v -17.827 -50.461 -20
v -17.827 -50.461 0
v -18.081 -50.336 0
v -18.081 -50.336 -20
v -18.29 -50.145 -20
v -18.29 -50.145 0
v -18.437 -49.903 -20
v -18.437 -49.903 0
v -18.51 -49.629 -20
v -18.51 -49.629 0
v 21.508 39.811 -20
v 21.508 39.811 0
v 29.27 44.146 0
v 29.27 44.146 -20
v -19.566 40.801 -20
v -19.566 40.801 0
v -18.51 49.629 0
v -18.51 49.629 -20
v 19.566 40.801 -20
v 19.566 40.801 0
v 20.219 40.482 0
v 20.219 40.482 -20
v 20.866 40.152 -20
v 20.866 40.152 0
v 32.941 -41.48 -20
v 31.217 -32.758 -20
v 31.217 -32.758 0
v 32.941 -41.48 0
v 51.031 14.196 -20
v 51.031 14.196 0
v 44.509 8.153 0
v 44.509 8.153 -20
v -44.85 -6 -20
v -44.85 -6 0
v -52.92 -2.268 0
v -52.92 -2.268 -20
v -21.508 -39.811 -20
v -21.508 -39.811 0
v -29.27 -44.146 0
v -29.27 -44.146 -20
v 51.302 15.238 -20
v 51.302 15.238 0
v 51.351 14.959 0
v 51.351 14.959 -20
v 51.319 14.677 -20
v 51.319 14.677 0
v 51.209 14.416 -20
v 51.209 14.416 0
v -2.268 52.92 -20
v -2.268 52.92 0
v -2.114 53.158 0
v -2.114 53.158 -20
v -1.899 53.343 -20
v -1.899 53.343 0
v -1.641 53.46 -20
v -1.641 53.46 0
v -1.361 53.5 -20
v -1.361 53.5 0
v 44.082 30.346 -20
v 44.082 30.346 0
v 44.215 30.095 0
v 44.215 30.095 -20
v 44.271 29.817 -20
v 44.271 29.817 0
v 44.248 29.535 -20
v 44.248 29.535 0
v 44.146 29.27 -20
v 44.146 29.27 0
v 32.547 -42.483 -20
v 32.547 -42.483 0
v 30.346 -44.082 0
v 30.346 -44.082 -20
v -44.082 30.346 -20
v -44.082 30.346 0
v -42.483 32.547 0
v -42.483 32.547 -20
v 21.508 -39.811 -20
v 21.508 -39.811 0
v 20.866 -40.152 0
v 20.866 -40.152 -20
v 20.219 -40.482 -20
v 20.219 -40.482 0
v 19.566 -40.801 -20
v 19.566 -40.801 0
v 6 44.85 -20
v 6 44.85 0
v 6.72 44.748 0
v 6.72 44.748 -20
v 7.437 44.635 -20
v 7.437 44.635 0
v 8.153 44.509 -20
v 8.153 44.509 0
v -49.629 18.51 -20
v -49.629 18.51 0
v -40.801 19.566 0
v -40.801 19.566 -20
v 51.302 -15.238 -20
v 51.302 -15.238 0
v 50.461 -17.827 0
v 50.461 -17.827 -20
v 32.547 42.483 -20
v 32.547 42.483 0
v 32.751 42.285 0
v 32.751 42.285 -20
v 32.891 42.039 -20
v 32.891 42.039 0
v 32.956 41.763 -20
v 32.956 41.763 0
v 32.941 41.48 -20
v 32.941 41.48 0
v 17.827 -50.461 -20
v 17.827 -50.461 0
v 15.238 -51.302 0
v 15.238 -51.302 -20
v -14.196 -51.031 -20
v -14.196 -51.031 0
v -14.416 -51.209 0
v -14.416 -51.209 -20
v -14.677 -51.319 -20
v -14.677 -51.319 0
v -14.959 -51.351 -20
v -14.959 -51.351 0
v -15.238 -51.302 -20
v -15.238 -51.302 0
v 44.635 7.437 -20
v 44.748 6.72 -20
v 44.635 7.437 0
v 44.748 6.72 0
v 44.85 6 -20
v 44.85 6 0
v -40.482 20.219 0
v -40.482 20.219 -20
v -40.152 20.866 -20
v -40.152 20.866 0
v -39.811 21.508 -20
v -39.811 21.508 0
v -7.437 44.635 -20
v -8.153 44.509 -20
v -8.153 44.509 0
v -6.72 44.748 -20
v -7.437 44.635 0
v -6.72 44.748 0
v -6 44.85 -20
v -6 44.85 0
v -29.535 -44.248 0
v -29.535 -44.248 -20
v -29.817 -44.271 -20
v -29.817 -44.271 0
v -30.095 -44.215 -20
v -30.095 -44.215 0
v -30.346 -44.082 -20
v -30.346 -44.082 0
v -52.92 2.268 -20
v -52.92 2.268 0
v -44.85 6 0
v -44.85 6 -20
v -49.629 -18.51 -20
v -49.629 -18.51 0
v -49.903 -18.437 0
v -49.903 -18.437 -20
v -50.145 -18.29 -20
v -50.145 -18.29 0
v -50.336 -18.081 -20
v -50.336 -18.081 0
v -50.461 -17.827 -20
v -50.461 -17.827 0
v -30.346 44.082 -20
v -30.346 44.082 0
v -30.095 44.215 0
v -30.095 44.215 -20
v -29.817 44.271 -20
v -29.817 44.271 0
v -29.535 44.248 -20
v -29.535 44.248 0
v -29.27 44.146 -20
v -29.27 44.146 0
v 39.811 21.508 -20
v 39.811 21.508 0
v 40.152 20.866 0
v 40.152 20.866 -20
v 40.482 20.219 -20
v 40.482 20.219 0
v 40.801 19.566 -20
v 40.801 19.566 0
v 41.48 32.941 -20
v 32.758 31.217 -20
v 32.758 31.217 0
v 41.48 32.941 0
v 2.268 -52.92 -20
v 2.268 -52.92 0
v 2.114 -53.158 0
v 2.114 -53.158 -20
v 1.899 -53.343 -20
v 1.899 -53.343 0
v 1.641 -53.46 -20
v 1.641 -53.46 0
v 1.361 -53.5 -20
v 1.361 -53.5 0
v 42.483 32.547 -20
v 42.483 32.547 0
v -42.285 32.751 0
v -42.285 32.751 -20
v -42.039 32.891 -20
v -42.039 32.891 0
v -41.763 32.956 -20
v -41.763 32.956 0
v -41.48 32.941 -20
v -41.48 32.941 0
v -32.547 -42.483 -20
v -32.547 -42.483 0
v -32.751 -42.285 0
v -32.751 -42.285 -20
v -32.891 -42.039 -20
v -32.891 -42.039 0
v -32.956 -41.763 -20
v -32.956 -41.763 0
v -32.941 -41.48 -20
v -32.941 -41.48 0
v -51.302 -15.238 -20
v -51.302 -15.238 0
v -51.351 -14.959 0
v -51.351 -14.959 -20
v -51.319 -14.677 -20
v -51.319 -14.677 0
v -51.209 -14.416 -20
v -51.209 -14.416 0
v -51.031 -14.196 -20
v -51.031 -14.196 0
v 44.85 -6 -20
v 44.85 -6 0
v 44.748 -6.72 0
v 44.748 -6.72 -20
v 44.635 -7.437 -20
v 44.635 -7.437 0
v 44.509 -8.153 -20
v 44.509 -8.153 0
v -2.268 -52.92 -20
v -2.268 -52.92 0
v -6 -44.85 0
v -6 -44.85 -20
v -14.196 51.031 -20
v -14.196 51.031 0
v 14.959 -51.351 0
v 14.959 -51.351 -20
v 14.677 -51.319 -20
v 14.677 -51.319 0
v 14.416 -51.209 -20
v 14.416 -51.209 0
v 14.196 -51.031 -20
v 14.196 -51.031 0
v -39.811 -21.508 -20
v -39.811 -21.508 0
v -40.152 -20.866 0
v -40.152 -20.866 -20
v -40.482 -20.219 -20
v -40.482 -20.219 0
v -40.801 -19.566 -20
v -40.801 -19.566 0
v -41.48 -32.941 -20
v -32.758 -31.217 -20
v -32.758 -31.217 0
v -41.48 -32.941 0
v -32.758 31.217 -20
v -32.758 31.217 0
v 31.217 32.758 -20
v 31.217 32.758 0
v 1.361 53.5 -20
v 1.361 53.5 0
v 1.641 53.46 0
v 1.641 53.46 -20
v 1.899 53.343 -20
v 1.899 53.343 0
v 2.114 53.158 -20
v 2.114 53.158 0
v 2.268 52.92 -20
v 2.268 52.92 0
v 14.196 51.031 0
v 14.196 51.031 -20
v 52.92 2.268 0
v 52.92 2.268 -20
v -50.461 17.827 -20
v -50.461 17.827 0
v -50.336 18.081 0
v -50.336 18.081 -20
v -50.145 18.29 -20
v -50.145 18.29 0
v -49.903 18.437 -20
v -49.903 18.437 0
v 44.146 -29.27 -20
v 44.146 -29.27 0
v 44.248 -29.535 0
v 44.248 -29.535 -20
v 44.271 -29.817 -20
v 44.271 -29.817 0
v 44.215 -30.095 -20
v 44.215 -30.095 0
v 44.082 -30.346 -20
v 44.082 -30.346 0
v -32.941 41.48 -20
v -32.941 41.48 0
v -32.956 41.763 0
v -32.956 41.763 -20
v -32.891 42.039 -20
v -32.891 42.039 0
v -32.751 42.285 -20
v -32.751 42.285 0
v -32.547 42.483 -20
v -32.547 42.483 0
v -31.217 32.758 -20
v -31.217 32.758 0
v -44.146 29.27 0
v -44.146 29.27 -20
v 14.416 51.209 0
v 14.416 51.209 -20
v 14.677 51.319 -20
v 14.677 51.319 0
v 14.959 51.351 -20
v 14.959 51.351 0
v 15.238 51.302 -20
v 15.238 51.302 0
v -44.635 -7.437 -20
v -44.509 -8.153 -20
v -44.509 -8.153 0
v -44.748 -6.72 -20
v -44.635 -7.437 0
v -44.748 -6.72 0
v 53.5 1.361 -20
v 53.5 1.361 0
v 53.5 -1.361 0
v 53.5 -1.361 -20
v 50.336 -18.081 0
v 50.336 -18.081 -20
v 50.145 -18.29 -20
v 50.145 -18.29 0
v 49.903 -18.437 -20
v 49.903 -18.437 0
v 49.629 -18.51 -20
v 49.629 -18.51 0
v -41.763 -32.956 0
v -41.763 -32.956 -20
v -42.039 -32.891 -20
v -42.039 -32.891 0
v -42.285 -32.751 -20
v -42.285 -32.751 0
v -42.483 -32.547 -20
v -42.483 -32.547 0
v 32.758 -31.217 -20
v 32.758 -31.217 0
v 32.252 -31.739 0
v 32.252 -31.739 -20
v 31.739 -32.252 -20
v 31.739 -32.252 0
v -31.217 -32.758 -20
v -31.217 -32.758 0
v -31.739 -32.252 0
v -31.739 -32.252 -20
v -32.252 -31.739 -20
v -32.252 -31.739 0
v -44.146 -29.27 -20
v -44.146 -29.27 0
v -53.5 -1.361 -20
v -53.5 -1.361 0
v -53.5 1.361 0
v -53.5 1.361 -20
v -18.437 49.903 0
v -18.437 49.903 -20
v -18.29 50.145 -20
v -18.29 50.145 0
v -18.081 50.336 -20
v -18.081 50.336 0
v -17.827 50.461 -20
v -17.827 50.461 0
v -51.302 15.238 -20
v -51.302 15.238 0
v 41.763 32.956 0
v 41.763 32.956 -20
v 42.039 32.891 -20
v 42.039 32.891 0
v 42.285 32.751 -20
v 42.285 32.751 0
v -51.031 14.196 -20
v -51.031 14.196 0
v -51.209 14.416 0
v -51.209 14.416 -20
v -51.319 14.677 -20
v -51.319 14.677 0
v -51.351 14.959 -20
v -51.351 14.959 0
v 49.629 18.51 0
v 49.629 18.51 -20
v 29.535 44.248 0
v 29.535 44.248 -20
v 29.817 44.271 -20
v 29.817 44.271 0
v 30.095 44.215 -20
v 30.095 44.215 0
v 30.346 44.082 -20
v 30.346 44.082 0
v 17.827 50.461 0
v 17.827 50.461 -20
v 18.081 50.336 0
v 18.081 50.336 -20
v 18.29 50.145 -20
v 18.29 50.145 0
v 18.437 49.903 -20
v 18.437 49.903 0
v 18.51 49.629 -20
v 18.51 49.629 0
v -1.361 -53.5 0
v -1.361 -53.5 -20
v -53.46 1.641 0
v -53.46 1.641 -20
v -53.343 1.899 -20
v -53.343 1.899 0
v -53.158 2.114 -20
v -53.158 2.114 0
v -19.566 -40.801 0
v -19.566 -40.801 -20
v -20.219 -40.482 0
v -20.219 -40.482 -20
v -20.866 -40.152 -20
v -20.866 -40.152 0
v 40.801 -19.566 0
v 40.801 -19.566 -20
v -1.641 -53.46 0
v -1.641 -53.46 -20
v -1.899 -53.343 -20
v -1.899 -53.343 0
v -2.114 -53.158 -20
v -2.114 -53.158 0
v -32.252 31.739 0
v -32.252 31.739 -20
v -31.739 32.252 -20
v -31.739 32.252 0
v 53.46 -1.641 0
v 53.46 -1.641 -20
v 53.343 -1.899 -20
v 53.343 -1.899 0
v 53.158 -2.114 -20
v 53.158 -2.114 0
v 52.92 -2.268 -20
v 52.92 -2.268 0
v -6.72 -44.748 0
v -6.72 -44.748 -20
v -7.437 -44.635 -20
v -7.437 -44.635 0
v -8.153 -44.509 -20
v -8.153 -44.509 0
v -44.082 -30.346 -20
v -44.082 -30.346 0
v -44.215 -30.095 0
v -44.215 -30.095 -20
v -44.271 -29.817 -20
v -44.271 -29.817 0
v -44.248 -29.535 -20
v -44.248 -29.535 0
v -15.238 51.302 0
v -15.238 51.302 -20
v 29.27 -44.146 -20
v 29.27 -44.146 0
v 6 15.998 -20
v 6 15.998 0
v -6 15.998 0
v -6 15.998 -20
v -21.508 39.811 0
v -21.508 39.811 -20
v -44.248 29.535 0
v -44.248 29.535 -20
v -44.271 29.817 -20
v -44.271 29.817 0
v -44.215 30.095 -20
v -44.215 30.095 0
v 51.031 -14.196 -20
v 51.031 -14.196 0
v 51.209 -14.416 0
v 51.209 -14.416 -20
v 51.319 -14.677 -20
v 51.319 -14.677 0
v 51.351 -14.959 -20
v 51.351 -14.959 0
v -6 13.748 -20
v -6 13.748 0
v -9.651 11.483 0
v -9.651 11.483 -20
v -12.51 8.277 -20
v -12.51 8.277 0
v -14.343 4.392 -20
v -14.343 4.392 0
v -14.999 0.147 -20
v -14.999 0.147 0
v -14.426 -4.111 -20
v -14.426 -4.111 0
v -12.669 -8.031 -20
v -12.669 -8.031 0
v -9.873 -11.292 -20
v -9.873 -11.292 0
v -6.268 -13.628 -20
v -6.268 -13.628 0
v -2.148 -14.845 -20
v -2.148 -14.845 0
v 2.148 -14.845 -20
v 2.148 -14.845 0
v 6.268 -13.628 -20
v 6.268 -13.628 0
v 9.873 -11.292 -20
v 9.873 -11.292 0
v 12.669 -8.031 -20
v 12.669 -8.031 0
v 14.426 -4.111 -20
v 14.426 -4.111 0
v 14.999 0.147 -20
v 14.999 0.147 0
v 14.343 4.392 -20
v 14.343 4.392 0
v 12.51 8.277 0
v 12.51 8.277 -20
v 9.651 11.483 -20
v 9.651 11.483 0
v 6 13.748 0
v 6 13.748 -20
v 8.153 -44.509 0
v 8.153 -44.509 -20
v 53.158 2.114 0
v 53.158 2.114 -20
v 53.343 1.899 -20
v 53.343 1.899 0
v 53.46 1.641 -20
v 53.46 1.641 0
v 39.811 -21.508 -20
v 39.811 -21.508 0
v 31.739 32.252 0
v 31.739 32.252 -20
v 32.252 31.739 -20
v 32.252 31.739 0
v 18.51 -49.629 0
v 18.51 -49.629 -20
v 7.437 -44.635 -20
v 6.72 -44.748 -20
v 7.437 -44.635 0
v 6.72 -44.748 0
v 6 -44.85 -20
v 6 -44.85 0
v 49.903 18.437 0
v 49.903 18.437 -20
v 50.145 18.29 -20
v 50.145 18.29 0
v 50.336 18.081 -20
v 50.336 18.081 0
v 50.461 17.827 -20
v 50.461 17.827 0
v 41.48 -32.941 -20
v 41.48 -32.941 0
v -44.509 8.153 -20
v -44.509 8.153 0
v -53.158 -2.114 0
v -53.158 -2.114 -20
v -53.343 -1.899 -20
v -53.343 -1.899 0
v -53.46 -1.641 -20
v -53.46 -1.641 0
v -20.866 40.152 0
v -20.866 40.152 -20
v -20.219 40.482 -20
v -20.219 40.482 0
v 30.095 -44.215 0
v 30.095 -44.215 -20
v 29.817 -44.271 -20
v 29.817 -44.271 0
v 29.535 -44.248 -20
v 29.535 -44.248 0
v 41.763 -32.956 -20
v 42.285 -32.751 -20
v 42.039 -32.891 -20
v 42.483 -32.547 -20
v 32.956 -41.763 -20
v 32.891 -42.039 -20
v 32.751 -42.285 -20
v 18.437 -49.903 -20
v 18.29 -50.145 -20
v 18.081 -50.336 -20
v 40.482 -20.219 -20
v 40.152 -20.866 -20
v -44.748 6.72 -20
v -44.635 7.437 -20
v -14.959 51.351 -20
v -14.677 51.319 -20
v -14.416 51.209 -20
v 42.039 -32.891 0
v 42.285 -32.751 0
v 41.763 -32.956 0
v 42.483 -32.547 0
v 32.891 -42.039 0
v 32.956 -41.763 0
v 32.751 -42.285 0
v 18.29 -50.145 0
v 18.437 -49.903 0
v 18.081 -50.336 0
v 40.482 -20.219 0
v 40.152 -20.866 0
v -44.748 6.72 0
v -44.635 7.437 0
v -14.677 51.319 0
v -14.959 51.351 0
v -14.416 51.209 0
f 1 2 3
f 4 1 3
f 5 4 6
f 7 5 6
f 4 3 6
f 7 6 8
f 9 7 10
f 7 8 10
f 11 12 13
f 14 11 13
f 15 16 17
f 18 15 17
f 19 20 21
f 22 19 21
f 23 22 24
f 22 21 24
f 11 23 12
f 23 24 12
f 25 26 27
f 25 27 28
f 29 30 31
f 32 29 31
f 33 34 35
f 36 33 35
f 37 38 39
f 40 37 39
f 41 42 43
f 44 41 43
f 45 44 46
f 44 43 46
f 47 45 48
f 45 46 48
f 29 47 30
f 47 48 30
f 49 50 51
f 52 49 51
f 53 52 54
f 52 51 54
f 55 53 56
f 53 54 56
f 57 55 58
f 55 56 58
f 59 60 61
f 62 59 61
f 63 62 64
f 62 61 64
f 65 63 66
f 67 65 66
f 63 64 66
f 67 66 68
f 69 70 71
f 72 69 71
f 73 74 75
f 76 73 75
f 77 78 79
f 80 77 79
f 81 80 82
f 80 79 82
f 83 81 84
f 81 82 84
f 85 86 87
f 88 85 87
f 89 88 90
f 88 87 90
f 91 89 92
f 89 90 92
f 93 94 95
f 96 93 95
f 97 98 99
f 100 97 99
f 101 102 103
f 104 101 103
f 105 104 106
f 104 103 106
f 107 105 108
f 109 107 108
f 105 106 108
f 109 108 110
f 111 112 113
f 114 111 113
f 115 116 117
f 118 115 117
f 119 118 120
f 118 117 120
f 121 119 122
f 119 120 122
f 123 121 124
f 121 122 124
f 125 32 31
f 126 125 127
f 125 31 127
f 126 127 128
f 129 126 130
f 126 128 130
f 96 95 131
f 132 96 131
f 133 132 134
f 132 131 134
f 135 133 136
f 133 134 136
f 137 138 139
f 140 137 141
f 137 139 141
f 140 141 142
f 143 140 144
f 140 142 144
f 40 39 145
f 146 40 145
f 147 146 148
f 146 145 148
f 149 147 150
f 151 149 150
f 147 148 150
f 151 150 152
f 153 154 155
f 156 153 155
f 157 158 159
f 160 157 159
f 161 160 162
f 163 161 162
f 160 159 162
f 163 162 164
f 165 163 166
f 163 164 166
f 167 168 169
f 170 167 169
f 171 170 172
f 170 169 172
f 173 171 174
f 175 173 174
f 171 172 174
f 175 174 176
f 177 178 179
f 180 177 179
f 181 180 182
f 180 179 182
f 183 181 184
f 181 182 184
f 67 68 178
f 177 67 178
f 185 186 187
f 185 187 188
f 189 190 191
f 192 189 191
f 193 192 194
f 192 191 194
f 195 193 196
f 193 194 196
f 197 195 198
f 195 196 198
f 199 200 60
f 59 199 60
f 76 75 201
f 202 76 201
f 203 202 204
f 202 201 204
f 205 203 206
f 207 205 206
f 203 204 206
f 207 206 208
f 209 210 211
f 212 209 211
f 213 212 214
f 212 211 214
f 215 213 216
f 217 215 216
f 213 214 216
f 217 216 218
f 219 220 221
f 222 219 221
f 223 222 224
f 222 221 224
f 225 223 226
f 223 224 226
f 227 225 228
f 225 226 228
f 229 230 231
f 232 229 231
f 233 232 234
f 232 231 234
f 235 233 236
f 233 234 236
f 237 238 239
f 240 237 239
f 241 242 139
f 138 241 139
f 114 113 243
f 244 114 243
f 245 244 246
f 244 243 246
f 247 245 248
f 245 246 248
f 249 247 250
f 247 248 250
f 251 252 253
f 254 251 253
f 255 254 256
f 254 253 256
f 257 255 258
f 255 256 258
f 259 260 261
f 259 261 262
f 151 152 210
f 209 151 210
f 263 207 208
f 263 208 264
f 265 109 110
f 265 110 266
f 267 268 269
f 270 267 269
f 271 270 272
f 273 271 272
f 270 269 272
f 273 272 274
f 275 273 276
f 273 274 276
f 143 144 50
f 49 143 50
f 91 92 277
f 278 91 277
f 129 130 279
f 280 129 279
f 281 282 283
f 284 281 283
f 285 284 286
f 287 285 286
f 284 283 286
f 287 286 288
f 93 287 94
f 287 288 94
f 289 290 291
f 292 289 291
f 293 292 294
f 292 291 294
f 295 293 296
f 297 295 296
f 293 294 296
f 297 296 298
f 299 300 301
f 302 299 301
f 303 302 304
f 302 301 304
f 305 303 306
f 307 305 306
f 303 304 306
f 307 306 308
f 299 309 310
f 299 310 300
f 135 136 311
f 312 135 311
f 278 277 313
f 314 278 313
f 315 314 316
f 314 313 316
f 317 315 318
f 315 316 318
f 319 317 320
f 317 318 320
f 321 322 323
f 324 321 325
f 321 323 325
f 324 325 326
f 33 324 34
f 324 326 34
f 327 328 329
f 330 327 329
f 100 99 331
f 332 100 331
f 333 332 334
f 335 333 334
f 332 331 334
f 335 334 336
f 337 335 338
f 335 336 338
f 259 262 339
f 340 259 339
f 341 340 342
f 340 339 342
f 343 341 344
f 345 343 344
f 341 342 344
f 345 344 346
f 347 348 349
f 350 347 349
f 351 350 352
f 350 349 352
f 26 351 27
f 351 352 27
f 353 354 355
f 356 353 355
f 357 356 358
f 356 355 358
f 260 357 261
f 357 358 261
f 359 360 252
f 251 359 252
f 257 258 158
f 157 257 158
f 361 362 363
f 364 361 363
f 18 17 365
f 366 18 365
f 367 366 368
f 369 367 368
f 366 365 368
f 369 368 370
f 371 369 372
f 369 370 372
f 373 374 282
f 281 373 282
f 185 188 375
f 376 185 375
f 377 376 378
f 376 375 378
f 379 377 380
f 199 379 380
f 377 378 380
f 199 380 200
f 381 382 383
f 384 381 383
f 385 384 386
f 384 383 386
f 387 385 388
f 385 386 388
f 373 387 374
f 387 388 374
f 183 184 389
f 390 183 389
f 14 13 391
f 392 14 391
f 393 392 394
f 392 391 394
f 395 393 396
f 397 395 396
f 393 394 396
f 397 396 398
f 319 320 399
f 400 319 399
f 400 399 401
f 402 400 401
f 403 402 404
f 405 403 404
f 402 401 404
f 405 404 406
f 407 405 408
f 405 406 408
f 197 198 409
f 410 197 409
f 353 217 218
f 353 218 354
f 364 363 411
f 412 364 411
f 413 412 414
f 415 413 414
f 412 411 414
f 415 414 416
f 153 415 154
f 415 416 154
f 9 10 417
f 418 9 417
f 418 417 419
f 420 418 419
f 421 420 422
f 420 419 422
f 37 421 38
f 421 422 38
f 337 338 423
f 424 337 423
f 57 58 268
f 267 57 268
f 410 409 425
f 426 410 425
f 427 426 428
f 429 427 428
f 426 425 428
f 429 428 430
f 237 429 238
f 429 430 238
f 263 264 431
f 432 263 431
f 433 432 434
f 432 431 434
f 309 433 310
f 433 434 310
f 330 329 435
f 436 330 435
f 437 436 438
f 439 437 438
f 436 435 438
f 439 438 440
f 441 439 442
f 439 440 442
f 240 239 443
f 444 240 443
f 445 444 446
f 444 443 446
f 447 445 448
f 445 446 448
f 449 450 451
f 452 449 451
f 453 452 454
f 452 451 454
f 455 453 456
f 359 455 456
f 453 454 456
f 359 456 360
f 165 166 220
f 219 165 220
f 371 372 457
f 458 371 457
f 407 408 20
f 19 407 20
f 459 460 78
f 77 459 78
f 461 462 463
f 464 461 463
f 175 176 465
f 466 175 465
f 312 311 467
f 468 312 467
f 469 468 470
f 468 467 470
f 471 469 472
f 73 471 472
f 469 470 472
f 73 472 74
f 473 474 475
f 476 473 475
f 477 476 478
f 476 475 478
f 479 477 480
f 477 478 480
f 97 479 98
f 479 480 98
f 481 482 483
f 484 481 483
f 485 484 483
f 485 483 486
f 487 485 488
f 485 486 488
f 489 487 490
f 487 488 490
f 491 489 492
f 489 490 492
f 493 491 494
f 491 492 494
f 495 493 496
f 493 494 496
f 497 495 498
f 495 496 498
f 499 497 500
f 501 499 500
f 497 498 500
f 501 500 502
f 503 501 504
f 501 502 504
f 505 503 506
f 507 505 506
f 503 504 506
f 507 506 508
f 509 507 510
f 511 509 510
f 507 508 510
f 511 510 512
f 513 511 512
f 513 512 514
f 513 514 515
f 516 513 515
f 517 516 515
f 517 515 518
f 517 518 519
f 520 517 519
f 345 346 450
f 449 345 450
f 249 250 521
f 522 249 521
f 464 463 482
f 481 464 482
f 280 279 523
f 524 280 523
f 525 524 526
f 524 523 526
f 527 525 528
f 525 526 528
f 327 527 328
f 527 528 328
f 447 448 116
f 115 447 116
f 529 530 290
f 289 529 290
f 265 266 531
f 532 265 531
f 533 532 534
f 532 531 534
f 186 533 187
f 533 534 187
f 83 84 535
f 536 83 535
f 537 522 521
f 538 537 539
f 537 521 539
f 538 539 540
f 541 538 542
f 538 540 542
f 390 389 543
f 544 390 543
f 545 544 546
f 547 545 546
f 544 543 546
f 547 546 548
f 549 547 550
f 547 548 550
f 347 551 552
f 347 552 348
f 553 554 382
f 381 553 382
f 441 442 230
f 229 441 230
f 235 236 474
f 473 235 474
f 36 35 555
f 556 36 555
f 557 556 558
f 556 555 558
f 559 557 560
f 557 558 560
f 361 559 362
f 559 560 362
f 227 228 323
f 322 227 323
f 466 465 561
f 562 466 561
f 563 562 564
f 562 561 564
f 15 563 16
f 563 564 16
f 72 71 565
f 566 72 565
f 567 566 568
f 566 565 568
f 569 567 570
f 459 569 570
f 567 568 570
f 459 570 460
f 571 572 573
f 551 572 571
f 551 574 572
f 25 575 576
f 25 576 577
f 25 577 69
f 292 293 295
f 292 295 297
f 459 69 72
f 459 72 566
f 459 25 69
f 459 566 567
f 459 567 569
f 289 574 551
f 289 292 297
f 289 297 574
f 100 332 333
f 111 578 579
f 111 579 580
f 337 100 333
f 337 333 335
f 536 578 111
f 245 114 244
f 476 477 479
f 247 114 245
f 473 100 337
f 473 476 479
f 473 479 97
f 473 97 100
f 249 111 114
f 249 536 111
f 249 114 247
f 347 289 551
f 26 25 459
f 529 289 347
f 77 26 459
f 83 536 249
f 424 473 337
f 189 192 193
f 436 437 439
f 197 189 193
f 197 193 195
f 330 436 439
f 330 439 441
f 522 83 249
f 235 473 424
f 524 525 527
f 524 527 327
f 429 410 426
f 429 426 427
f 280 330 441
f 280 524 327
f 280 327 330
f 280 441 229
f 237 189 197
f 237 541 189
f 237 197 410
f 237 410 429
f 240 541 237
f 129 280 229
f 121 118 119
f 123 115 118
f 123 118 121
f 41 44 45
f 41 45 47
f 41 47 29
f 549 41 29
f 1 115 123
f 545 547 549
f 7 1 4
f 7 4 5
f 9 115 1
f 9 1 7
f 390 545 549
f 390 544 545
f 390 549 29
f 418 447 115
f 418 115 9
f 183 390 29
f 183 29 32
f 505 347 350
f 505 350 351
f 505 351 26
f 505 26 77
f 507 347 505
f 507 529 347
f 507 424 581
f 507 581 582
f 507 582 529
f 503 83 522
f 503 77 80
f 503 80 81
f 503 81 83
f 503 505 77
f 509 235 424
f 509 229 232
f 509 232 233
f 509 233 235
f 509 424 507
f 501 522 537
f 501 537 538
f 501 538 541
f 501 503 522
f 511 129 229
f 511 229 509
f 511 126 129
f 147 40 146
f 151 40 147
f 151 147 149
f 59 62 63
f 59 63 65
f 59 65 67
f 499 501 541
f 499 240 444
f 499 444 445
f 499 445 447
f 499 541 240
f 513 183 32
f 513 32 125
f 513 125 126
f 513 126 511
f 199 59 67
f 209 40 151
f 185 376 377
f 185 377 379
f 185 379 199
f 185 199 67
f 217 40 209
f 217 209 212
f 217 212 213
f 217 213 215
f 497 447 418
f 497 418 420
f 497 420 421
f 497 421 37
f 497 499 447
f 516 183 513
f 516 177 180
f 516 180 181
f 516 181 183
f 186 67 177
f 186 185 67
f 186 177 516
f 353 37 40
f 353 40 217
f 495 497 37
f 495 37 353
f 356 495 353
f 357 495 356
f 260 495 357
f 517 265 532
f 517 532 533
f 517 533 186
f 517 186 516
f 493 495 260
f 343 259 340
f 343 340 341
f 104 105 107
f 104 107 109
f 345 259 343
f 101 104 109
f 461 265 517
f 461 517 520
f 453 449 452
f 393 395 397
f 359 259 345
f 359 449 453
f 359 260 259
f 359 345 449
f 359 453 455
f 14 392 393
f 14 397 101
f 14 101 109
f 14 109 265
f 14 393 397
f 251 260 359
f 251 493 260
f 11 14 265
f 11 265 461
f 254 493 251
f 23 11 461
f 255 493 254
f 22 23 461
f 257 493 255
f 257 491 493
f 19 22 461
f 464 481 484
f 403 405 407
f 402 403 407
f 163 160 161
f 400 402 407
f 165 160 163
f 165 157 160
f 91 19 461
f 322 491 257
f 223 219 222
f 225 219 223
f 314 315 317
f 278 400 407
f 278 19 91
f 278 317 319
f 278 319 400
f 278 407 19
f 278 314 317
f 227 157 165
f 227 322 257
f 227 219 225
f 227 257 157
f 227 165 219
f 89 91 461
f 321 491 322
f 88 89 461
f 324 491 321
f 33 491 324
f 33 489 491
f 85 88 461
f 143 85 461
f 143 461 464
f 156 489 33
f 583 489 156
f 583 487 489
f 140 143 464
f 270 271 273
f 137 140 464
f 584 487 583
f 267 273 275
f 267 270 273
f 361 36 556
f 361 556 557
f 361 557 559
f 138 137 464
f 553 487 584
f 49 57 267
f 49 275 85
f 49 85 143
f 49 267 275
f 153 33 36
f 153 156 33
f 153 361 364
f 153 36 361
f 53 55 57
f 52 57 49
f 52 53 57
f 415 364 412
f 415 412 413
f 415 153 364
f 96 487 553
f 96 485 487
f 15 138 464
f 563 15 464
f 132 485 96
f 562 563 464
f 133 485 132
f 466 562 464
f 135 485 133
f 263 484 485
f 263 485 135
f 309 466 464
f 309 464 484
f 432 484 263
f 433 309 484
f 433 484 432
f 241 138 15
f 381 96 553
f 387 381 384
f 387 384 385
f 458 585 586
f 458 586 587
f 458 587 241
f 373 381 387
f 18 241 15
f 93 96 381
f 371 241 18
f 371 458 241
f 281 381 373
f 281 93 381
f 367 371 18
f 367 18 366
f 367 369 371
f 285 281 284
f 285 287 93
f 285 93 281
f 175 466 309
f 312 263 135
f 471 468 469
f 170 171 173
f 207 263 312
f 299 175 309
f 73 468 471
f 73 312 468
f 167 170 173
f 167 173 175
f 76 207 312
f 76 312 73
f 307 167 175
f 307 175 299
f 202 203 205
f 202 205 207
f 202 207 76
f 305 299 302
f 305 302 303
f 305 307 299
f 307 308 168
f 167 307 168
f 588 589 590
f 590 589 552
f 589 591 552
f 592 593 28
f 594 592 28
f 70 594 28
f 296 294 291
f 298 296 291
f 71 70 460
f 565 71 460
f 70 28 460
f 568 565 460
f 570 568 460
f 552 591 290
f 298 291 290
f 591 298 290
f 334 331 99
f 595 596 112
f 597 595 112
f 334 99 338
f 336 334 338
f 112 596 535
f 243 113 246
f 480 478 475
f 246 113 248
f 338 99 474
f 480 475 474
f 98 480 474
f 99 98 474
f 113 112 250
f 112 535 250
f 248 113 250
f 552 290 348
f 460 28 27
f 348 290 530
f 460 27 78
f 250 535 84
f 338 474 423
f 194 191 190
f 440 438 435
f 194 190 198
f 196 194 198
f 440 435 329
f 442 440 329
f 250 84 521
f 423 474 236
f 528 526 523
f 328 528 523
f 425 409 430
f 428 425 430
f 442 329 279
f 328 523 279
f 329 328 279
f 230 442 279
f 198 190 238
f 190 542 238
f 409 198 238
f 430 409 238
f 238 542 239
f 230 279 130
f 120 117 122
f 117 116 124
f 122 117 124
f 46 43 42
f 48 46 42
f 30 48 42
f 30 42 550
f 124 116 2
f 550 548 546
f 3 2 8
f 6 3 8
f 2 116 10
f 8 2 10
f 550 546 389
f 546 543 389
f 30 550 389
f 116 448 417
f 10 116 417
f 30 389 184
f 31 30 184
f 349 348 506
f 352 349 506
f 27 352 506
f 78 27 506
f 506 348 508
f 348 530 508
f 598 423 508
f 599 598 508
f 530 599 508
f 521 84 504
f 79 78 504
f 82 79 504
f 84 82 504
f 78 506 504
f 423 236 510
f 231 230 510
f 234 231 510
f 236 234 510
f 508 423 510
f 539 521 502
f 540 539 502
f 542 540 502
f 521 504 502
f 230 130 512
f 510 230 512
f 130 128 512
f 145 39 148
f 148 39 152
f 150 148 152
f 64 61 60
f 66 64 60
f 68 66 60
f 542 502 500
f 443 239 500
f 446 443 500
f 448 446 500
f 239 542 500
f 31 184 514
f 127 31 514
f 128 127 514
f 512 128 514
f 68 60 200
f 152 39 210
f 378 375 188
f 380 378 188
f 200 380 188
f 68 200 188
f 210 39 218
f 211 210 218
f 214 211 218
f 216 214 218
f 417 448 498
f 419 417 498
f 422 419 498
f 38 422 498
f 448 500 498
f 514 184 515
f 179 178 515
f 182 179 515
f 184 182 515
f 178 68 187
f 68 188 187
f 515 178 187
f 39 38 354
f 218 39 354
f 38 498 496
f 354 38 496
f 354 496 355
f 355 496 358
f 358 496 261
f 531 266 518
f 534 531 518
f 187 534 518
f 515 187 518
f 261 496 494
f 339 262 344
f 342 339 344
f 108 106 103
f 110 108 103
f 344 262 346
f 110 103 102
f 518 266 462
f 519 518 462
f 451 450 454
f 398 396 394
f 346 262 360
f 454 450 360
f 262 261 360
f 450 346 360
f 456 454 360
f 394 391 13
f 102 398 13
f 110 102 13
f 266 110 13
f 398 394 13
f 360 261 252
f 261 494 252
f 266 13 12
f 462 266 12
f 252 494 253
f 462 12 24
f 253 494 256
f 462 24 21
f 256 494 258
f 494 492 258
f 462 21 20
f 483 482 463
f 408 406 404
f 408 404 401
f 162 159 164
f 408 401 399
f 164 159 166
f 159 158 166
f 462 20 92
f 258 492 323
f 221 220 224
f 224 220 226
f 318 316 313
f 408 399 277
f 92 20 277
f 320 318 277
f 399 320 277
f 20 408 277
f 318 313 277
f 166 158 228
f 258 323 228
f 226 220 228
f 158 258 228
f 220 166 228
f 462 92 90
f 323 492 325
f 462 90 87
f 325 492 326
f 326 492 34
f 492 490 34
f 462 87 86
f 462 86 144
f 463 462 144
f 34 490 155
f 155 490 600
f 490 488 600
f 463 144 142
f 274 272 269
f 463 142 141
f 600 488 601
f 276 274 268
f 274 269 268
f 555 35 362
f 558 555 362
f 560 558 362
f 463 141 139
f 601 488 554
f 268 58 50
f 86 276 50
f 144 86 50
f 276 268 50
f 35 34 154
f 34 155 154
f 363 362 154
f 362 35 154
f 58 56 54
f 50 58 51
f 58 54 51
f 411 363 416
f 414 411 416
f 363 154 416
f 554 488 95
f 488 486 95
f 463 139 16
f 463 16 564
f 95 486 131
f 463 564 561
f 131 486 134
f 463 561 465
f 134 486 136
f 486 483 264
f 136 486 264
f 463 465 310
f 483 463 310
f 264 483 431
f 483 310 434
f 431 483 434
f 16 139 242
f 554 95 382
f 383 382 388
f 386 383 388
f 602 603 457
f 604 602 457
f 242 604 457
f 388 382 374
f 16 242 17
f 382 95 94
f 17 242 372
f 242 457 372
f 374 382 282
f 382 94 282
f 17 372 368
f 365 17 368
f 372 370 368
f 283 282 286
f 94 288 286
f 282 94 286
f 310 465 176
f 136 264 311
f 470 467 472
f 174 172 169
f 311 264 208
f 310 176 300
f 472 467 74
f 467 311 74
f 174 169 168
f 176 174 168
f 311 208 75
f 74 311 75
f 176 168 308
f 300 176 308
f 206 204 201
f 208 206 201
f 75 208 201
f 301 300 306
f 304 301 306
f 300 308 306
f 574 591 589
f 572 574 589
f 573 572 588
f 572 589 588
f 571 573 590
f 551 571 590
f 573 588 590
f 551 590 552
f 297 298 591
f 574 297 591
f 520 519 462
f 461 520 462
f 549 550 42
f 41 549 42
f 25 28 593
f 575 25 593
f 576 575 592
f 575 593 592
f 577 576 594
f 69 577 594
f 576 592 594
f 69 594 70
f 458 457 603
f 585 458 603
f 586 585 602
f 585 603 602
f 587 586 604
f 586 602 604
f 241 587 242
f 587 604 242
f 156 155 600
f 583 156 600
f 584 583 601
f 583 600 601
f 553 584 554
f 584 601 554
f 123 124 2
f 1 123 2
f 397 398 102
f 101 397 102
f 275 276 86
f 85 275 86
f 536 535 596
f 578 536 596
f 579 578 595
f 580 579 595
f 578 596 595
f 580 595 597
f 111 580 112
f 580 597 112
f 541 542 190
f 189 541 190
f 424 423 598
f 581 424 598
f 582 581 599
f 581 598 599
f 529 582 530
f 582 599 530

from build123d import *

# Parameters (mm, degrees)
BOSS_EXTRUDE1_DEPTH = 20


with BuildPart() as part:
    # Sketch1 → Boss-Extrude1 (new body)
    with BuildSketch(Plane.XY):
        with BuildLine():
            Line((-1.360697771, 53.5), (1.360697771, 53.5))
            ThreePointArc((1.360697771, 53.5), (1.899334334, 53.342538221), (2.268341553, 52.919741307))
            Line((2.268341553, 52.919741307), (6, 44.850445929))
            ThreePointArc((6, 44.850445929), (7.078659543, 44.692897412), (8.153210899, 44.509410825))
            Line((8.153210899, 44.509410825), (14.195778386, 51.030620899))
            ThreePointArc((14.195778386, 51.030620899), (14.677376539, 51.318695158), (15.238308717, 51.302002357))
            Line((15.238308717, 51.302002357), (17.826509681, 50.461044886))
            ThreePointArc((17.826509681, 50.461044886), (18.290125128, 50.144841983), (18.510420417, 49.628708722))
            Line((18.510420417, 49.628708722), (19.565889095, 40.801206893))
            ThreePointArc((19.565889095, 40.801206893), (20.543070113, 40.31804522), (21.508328709, 39.811484475))
            Line((21.508328709, 39.811484475), (29.27031663, 44.146267767))
            ThreePointArc((29.27031663, 44.146267767), (29.817363532, 44.271420654), (30.345683377, 44.082207282))
            Line((30.345683377, 44.082207282), (32.547338618, 42.482611117))
            ThreePointArc((32.547338618, 42.482611117), (32.89055104, 42.038619233), (32.940570361, 41.479672343))
            Line((32.940570361, 41.479672343), (31.216532642, 32.758061448))
            ThreePointArc((31.216532642, 32.758061448), (31.996581849, 31.996581849), (32.758061448, 31.216532642))
            Line((32.758061448, 31.216532642), (41.479672343, 32.940570361))
            ThreePointArc((41.479672343, 32.940570361), (42.038619233, 32.89055104), (42.482611117, 32.547338618))
            Line((42.482611117, 32.547338618), (44.082207282, 30.345683377))
            ThreePointArc((44.082207282, 30.345683377), (44.271420654, 29.817363532), (44.146267767, 29.27031663))
            Line((44.146267767, 29.27031663), (39.811484475, 21.508328709))
            ThreePointArc((39.811484475, 21.508328709), (40.31804522, 20.543070113), (40.801206893, 19.565889095))
            Line((40.801206893, 19.565889095), (49.628708722, 18.510420417))
            ThreePointArc((49.628708722, 18.510420417), (50.144841983, 18.290125128), (50.461044886, 17.826509681))
            Line((50.461044886, 17.826509681), (51.302002357, 15.238308717))
            ThreePointArc((51.302002357, 15.238308717), (51.318695158, 14.677376539), (51.030620899, 14.195778386))
            Line((51.030620899, 14.195778386), (44.509410825, 8.153210899))
            ThreePointArc((44.509410825, 8.153210899), (44.692897412, 7.078659543), (44.850445929, 6))
            Line((44.850445929, 6), (52.919741307, 2.268341553))
            ThreePointArc((52.919741307, 2.268341553), (53.342538221, 1.899334334), (53.5, 1.360697771))
            Line((53.5, 1.360697771), (53.5, -1.360697771))
            ThreePointArc((53.5, -1.360697771), (53.342538221, -1.899334334), (52.919741307, -2.268341553))
            Line((52.919741307, -2.268341553), (44.850445929, -6))
            ThreePointArc((44.850445929, -6), (44.692897412, -7.078659543), (44.509410825, -8.153210899))
            Line((44.509410825, -8.153210899), (51.030620899, -14.195778386))
            ThreePointArc((51.030620899, -14.195778386), (51.318695158, -14.677376539), (51.302002357, -15.238308717))
            Line((51.302002357, -15.238308717), (50.461044886, -17.826509681))
            ThreePointArc((50.461044886, -17.826509681), (50.144841983, -18.290125128), (49.628708722, -18.510420417))
            Line((49.628708722, -18.510420417), (40.801206893, -19.565889095))
            ThreePointArc((40.801206893, -19.565889095), (40.31804522, -20.543070113), (39.811484475, -21.508328709))
            Line((39.811484475, -21.508328709), (44.146267767, -29.27031663))
            ThreePointArc((44.146267767, -29.27031663), (44.271420654, -29.817363532), (44.082207282, -30.345683377))
            Line((44.082207282, -30.345683377), (42.482611117, -32.547338618))
            ThreePointArc((42.482611117, -32.547338618), (42.038619233, -32.89055104), (41.479672343, -32.940570361))
            Line((41.479672343, -32.940570361), (32.758061448, -31.216532642))
            ThreePointArc((32.758061448, -31.216532642), (31.996581849, -31.996581849), (31.216532642, -32.758061448))
            Line((31.216532642, -32.758061448), (32.940570361, -41.479672343))
            ThreePointArc((32.940570361, -41.479672343), (32.89055104, -42.038619233), (32.547338618, -42.482611117))
            Line((32.547338618, -42.482611117), (30.345683377, -44.082207282))
            ThreePointArc((30.345683377, -44.082207282), (29.817363532, -44.271420654), (29.27031663, -44.146267767))
            Line((29.27031663, -44.146267767), (21.508328709, -39.811484475))
            ThreePointArc((21.508328709, -39.811484475), (20.543070113, -40.31804522), (19.565889095, -40.801206893))
            Line((19.565889095, -40.801206893), (18.510420417, -49.628708722))
            ThreePointArc((18.510420417, -49.628708722), (18.290125128, -50.144841983), (17.826509681, -50.461044886))
            Line((17.826509681, -50.461044886), (15.238308717, -51.302002357))
            ThreePointArc((15.238308717, -51.302002357), (14.677376539, -51.318695158), (14.195778386, -51.030620899))
            Line((14.195778386, -51.030620899), (8.153210899, -44.509410825))
            ThreePointArc((8.153210899, -44.509410825), (7.078659543, -44.692897412), (6, -44.850445929))
            Line((6, -44.850445929), (2.268341553, -52.919741307))
            ThreePointArc((2.268341553, -52.919741307), (1.899334334, -53.342538221), (1.360697771, -53.5))
            Line((1.360697771, -53.5), (-1.360697771, -53.5))
            ThreePointArc((-1.360697771, -53.5), (-1.899334334, -53.342538221), (-2.268341553, -52.919741307))
            Line((-2.268341553, -52.919741307), (-6, -44.850445929))
            ThreePointArc((-6, -44.850445929), (-7.078659543, -44.692897412), (-8.153210899, -44.509410825))
            Line((-8.153210899, -44.509410825), (-14.195778386, -51.030620899))
            ThreePointArc((-14.195778386, -51.030620899), (-14.677376539, -51.318695158), (-15.238308717, -51.302002357))
            Line((-15.238308717, -51.302002357), (-17.826509681, -50.461044886))
            ThreePointArc((-17.826509681, -50.461044886), (-18.290125128, -50.144841983), (-18.510420417, -49.628708722))
            Line((-18.510420417, -49.628708722), (-19.565889095, -40.801206893))
            ThreePointArc((-19.565889095, -40.801206893), (-20.543070113, -40.31804522), (-21.508328709, -39.811484475))
            Line((-21.508328709, -39.811484475), (-29.27031663, -44.146267767))
            ThreePointArc((-29.27031663, -44.146267767), (-29.817363532, -44.271420654), (-30.345683377, -44.082207282))
            Line((-30.345683377, -44.082207282), (-32.547338618, -42.482611117))
            ThreePointArc((-32.547338618, -42.482611117), (-32.89055104, -42.038619233), (-32.940570361, -41.479672343))
            Line((-32.940570361, -41.479672343), (-31.216532642, -32.758061448))
            ThreePointArc((-31.216532642, -32.758061448), (-31.996581849, -31.996581849), (-32.758061448, -31.216532642))
            Line((-32.758061448, -31.216532642), (-41.479672343, -32.940570361))
            ThreePointArc((-41.479672343, -32.940570361), (-42.038619233, -32.89055104), (-42.482611117, -32.547338618))
            Line((-42.482611117, -32.547338618), (-44.082207282, -30.345683377))
            ThreePointArc((-44.082207282, -30.345683377), (-44.271420654, -29.817363532), (-44.146267767, -29.27031663))
            Line((-44.146267767, -29.27031663), (-39.811484475, -21.508328709))
            ThreePointArc((-39.811484475, -21.508328709), (-40.31804522, -20.543070113), (-40.801206893, -19.565889095))
            Line((-40.801206893, -19.565889095), (-49.628708722, -18.510420417))
            ThreePointArc((-49.628708722, -18.510420417), (-50.144841983, -18.290125128), (-50.461044886, -17.826509681))
            Line((-50.461044886, -17.826509681), (-51.302002357, -15.238308717))
            ThreePointArc((-51.302002357, -15.238308717), (-51.318695158, -14.677376539), (-51.030620899, -14.195778386))
            Line((-51.030620899, -14.195778386), (-44.509410825, -8.153210899))
            ThreePointArc((-44.509410825, -8.153210899), (-44.692897412, -7.078659543), (-44.850445929, -6))
            Line((-44.850445929, -6), (-52.919741307, -2.268341553))
            ThreePointArc((-52.919741307, -2.268341553), (-53.342538221, -1.899334334), (-53.5, -1.360697771))
            Line((-53.5, -1.360697771), (-53.5, 1.360697771))
            ThreePointArc((-53.5, 1.360697771), (-53.342538221, 1.899334334), (-52.919741307, 2.268341553))
            Line((-52.919741307, 2.268341553), (-44.850445929, 6))
            ThreePointArc((-44.850445929, 6), (-44.692897412, 7.078659543), (-44.509410825, 8.153210899))
            Line((-44.509410825, 8.153210899), (-51.030620899, 14.195778386))
            ThreePointArc((-51.030620899, 14.195778386), (-51.318695158, 14.677376539), (-51.302002357, 15.238308717))
            Line((-51.302002357, 15.238308717), (-50.461044886, 17.826509681))
            ThreePointArc((-50.461044886, 17.826509681), (-50.144841983, 18.290125128), (-49.628708722, 18.510420417))
            Line((-49.628708722, 18.510420417), (-40.801206893, 19.565889095))
            ThreePointArc((-40.801206893, 19.565889095), (-40.31804522, 20.543070113), (-39.811484475, 21.508328709))
            Line((-39.811484475, 21.508328709), (-44.146267767, 29.27031663))
            ThreePointArc((-44.146267767, 29.27031663), (-44.271420654, 29.817363532), (-44.082207282, 30.345683377))
            Line((-44.082207282, 30.345683377), (-42.482611117, 32.547338618))
            ThreePointArc((-42.482611117, 32.547338618), (-42.038619233, 32.89055104), (-41.479672343, 32.940570361))
            Line((-41.479672343, 32.940570361), (-32.758061448, 31.216532642))
            ThreePointArc((-32.758061448, 31.216532642), (-31.996581849, 31.996581849), (-31.216532642, 32.758061448))
            Line((-31.216532642, 32.758061448), (-32.940570361, 41.479672343))
            ThreePointArc((-32.940570361, 41.479672343), (-32.89055104, 42.038619233), (-32.547338618, 42.482611117))
            Line((-32.547338618, 42.482611117), (-30.345683377, 44.082207282))
            ThreePointArc((-30.345683377, 44.082207282), (-29.817363532, 44.271420654), (-29.27031663, 44.146267767))
            Line((-29.27031663, 44.146267767), (-21.508328709, 39.811484475))
            ThreePointArc((-21.508328709, 39.811484475), (-20.543070113, 40.31804522), (-19.565889095, 40.801206893))
            Line((-19.565889095, 40.801206893), (-18.510420417, 49.628708722))
            ThreePointArc((-18.510420417, 49.628708722), (-18.290125128, 50.144841983), (-17.826509681, 50.461044886))
            Line((-17.826509681, 50.461044886), (-15.238308717, 51.302002357))
            ThreePointArc((-15.238308717, 51.302002357), (-14.677376539, 51.318695158), (-14.195778386, 51.030620899))
            Line((-14.195778386, 51.030620899), (-8.153210899, 44.509410825))
            ThreePointArc((-8.153210899, 44.509410825), (-7.078659543, 44.692897412), (-6, 44.850445929))
            Line((-6, 44.850445929), (-2.268341553, 52.919741307))
            ThreePointArc((-2.268341553, 52.919741307), (-1.899334334, 53.342538221), (-1.360697771, 53.5))
        make_face()
        with BuildLine():
            Line((6, 13.747727085), (6, 15.997727085))
            Line((6, 15.997727085), (-6, 15.997727085))
            Line((-6, 15.997727085), (-6, 13.747727085))
            ThreePointArc((-6, 13.747727085), (0, -15), (6, 13.747727085))
        make_face(mode=Mode.SUBTRACT)
    extrude(amount=-BOSS_EXTRUDE1_DEPTH)


solid = part.part
